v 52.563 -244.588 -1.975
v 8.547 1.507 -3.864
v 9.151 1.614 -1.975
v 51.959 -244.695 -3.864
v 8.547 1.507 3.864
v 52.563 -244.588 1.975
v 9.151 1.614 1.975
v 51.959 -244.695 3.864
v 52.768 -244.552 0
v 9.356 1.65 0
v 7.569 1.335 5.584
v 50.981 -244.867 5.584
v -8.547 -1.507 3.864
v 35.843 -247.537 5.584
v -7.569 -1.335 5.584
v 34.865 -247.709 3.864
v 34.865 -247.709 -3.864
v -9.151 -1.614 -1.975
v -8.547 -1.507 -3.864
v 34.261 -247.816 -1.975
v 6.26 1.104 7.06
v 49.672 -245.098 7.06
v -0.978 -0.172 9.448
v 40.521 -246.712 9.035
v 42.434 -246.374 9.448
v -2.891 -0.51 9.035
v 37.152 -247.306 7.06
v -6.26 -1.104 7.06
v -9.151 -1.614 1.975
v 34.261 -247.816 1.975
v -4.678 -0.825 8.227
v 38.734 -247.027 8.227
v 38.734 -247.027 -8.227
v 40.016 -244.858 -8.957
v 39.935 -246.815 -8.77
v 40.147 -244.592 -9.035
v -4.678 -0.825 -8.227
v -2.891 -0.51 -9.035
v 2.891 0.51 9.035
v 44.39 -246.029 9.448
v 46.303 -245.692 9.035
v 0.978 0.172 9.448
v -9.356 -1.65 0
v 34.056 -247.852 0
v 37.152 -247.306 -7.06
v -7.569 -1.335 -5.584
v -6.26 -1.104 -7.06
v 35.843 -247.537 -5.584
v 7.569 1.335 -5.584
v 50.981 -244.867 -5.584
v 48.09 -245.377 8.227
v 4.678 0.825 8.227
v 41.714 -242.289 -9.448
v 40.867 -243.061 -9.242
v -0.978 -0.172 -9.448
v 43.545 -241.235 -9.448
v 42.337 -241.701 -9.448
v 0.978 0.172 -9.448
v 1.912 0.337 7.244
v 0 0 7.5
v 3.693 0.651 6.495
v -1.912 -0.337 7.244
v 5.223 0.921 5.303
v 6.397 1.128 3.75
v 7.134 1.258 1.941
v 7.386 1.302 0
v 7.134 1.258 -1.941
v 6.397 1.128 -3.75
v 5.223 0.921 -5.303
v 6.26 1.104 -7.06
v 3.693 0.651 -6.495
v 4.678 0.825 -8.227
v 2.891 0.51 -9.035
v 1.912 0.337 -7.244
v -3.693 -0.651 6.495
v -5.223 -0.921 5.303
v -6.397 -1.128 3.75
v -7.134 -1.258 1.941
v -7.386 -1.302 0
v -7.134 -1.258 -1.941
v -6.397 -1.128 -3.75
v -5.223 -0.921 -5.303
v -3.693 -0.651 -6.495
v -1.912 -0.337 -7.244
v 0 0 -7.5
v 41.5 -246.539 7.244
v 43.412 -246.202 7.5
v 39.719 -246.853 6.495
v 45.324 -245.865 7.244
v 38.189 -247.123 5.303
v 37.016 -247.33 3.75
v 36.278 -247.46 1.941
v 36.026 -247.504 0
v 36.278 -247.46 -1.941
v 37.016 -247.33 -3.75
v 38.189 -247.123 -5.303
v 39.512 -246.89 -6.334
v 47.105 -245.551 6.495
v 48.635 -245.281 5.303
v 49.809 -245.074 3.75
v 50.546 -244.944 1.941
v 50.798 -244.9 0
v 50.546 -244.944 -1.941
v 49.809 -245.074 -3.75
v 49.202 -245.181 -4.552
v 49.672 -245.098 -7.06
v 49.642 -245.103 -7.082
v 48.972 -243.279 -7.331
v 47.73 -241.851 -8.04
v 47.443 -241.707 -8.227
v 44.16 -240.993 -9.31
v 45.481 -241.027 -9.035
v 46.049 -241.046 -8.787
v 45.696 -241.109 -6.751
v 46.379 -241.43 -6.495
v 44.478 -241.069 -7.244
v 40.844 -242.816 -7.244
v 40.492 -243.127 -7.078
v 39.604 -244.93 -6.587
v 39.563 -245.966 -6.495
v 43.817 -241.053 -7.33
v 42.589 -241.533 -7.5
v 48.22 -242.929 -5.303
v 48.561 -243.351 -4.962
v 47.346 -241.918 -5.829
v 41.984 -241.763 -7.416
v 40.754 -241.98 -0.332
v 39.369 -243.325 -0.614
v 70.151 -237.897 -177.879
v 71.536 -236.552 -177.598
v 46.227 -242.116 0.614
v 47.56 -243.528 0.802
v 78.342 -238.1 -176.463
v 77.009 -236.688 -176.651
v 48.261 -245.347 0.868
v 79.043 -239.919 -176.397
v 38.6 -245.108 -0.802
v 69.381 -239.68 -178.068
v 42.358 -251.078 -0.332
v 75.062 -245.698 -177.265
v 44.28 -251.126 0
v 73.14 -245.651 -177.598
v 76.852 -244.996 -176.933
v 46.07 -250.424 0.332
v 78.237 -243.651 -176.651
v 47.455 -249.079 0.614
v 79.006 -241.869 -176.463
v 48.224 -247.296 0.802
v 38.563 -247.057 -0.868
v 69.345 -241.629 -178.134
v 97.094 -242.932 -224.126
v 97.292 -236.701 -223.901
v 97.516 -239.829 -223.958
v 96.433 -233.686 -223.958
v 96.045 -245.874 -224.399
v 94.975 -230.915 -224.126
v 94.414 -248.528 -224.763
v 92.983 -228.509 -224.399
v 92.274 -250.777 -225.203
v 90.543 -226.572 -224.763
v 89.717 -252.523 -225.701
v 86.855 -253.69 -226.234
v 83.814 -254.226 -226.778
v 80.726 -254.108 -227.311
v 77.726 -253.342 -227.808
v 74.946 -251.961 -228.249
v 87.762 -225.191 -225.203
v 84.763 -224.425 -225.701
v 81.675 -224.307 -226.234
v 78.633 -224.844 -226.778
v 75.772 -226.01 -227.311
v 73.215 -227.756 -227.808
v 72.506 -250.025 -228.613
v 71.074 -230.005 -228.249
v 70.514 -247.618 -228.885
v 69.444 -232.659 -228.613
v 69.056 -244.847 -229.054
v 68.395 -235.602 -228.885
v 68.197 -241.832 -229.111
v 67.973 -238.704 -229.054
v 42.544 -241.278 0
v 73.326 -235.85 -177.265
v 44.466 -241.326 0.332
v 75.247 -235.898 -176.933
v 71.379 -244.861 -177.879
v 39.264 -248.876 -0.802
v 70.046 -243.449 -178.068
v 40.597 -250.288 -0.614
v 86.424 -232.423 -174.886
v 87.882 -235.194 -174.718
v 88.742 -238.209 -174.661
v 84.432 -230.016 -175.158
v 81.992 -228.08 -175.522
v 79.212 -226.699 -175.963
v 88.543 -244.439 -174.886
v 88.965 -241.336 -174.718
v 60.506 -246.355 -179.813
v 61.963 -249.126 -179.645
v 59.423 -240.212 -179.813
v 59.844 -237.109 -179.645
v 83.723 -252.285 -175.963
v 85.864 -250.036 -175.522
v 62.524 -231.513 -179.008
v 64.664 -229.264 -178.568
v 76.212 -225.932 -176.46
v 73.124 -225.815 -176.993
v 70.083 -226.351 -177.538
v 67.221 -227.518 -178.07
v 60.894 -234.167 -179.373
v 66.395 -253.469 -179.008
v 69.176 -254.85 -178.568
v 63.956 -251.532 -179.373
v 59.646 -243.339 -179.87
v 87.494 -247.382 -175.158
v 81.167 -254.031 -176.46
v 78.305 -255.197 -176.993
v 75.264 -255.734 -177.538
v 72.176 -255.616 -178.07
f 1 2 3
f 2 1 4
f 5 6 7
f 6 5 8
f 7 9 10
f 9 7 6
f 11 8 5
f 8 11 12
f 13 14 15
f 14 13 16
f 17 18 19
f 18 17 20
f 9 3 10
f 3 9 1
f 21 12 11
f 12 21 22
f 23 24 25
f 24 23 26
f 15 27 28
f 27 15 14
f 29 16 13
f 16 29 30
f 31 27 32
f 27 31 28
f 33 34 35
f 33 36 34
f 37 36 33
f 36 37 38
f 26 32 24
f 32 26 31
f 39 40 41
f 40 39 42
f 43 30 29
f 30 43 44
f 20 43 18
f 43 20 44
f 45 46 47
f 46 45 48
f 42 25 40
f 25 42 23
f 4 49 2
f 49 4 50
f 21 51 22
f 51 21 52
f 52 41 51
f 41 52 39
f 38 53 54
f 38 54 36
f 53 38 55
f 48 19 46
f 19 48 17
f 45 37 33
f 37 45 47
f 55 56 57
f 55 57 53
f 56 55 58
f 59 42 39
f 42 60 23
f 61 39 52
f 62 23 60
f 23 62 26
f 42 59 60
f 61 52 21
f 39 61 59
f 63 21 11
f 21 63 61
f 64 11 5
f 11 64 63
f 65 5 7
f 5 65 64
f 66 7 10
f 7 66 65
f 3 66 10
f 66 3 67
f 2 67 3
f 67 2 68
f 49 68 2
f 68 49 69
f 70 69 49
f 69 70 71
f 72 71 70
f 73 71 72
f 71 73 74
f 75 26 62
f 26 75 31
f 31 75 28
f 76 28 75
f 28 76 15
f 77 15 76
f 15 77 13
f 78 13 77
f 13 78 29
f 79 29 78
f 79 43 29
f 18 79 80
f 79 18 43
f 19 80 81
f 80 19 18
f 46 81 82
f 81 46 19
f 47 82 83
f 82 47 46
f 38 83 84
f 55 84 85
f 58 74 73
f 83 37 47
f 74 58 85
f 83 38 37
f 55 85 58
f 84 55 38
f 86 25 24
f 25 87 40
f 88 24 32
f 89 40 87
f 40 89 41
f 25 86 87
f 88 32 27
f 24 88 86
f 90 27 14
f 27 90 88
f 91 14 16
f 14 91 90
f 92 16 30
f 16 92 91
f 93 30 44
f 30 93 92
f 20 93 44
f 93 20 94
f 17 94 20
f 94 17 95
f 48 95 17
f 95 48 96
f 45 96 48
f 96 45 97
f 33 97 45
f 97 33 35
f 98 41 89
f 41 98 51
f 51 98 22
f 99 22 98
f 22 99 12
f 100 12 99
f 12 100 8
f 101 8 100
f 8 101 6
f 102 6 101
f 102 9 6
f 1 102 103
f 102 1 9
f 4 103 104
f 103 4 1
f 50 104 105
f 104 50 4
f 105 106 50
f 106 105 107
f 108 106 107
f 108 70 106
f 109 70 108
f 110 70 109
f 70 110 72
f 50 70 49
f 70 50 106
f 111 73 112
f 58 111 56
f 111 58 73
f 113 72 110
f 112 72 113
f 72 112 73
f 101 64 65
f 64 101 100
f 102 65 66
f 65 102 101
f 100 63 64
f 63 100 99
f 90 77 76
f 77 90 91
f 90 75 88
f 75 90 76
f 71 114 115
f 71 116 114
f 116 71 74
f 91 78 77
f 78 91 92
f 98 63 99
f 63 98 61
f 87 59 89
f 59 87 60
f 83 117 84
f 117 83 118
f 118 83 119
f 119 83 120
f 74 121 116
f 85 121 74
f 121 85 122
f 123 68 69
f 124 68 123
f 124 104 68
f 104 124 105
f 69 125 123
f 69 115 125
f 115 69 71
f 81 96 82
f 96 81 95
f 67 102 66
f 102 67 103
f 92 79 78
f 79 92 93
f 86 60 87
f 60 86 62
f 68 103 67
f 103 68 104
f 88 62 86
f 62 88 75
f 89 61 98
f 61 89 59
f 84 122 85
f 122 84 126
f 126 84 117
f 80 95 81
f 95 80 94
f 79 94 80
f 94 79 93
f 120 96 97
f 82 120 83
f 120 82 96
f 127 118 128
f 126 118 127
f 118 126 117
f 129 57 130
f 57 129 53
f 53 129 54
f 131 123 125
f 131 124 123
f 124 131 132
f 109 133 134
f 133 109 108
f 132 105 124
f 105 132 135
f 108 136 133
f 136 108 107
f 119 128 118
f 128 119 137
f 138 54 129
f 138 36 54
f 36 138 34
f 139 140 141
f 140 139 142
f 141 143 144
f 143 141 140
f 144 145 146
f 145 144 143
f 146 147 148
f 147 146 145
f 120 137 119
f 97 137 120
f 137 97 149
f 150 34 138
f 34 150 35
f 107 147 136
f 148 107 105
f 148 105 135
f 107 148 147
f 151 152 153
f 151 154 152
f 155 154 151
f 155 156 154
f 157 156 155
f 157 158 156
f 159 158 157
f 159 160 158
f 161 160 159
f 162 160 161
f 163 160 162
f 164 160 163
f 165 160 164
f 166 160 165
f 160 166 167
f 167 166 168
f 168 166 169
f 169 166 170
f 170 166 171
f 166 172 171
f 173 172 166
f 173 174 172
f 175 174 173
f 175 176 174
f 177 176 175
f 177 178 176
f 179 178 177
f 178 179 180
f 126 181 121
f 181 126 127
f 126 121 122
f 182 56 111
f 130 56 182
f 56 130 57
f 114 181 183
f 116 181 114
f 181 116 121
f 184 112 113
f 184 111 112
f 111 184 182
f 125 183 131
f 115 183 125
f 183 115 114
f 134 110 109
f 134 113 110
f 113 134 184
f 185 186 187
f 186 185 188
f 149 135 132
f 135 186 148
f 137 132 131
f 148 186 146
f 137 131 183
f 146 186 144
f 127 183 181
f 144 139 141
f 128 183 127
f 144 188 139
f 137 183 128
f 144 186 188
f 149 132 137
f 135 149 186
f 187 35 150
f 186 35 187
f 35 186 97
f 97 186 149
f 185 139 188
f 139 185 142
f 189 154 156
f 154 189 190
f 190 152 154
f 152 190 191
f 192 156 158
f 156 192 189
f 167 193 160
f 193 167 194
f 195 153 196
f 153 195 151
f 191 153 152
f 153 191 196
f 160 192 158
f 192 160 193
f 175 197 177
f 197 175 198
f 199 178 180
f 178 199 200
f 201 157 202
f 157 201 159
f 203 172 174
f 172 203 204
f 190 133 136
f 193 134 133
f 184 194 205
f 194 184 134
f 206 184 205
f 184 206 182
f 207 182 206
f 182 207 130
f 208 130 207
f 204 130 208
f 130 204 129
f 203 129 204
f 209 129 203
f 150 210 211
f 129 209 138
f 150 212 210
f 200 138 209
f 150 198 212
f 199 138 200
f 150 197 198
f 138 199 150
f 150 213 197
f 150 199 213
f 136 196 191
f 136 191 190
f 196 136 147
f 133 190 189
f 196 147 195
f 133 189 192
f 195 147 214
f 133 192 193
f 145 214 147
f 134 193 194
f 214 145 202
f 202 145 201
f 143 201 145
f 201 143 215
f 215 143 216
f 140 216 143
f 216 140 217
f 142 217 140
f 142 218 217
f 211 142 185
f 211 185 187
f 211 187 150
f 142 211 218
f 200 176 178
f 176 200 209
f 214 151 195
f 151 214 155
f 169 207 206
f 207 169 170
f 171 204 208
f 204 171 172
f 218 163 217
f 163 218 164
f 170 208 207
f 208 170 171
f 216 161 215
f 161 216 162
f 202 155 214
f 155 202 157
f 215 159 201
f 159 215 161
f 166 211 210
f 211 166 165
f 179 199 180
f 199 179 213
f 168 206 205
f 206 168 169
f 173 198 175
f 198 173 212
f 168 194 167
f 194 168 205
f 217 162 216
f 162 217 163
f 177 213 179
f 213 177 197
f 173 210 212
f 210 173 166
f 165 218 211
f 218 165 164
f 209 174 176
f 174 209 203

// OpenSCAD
arm_length=250; //mm
pendulo_length=230;
pared=2;
diam_tubo=19;

module arm(){
  rotate([90,0,0])
  difference(){
    cylinder(h=arm_length,r=diam_tubo/2.0,center=false);
    cylinder(h=arm_length+1,r=(diam_tubo/2.0)-pared,center=false);
  } 
}

module pendulo(){
union(){
    cylinder(h=pendulo_length,r=5,center=false);
    cylinder(h=50,r=15,center=false);
}
}

module furuta(theta_a=0,theta_p=0){
  rotate([0,0,theta_a]){
    color("orangered")
    arm();
    color("gray")
    rotate([0,-theta_p,0])
    translate([0,-arm_length,-pendulo_length])
    pendulo();
  }
}

furuta(10,10);
